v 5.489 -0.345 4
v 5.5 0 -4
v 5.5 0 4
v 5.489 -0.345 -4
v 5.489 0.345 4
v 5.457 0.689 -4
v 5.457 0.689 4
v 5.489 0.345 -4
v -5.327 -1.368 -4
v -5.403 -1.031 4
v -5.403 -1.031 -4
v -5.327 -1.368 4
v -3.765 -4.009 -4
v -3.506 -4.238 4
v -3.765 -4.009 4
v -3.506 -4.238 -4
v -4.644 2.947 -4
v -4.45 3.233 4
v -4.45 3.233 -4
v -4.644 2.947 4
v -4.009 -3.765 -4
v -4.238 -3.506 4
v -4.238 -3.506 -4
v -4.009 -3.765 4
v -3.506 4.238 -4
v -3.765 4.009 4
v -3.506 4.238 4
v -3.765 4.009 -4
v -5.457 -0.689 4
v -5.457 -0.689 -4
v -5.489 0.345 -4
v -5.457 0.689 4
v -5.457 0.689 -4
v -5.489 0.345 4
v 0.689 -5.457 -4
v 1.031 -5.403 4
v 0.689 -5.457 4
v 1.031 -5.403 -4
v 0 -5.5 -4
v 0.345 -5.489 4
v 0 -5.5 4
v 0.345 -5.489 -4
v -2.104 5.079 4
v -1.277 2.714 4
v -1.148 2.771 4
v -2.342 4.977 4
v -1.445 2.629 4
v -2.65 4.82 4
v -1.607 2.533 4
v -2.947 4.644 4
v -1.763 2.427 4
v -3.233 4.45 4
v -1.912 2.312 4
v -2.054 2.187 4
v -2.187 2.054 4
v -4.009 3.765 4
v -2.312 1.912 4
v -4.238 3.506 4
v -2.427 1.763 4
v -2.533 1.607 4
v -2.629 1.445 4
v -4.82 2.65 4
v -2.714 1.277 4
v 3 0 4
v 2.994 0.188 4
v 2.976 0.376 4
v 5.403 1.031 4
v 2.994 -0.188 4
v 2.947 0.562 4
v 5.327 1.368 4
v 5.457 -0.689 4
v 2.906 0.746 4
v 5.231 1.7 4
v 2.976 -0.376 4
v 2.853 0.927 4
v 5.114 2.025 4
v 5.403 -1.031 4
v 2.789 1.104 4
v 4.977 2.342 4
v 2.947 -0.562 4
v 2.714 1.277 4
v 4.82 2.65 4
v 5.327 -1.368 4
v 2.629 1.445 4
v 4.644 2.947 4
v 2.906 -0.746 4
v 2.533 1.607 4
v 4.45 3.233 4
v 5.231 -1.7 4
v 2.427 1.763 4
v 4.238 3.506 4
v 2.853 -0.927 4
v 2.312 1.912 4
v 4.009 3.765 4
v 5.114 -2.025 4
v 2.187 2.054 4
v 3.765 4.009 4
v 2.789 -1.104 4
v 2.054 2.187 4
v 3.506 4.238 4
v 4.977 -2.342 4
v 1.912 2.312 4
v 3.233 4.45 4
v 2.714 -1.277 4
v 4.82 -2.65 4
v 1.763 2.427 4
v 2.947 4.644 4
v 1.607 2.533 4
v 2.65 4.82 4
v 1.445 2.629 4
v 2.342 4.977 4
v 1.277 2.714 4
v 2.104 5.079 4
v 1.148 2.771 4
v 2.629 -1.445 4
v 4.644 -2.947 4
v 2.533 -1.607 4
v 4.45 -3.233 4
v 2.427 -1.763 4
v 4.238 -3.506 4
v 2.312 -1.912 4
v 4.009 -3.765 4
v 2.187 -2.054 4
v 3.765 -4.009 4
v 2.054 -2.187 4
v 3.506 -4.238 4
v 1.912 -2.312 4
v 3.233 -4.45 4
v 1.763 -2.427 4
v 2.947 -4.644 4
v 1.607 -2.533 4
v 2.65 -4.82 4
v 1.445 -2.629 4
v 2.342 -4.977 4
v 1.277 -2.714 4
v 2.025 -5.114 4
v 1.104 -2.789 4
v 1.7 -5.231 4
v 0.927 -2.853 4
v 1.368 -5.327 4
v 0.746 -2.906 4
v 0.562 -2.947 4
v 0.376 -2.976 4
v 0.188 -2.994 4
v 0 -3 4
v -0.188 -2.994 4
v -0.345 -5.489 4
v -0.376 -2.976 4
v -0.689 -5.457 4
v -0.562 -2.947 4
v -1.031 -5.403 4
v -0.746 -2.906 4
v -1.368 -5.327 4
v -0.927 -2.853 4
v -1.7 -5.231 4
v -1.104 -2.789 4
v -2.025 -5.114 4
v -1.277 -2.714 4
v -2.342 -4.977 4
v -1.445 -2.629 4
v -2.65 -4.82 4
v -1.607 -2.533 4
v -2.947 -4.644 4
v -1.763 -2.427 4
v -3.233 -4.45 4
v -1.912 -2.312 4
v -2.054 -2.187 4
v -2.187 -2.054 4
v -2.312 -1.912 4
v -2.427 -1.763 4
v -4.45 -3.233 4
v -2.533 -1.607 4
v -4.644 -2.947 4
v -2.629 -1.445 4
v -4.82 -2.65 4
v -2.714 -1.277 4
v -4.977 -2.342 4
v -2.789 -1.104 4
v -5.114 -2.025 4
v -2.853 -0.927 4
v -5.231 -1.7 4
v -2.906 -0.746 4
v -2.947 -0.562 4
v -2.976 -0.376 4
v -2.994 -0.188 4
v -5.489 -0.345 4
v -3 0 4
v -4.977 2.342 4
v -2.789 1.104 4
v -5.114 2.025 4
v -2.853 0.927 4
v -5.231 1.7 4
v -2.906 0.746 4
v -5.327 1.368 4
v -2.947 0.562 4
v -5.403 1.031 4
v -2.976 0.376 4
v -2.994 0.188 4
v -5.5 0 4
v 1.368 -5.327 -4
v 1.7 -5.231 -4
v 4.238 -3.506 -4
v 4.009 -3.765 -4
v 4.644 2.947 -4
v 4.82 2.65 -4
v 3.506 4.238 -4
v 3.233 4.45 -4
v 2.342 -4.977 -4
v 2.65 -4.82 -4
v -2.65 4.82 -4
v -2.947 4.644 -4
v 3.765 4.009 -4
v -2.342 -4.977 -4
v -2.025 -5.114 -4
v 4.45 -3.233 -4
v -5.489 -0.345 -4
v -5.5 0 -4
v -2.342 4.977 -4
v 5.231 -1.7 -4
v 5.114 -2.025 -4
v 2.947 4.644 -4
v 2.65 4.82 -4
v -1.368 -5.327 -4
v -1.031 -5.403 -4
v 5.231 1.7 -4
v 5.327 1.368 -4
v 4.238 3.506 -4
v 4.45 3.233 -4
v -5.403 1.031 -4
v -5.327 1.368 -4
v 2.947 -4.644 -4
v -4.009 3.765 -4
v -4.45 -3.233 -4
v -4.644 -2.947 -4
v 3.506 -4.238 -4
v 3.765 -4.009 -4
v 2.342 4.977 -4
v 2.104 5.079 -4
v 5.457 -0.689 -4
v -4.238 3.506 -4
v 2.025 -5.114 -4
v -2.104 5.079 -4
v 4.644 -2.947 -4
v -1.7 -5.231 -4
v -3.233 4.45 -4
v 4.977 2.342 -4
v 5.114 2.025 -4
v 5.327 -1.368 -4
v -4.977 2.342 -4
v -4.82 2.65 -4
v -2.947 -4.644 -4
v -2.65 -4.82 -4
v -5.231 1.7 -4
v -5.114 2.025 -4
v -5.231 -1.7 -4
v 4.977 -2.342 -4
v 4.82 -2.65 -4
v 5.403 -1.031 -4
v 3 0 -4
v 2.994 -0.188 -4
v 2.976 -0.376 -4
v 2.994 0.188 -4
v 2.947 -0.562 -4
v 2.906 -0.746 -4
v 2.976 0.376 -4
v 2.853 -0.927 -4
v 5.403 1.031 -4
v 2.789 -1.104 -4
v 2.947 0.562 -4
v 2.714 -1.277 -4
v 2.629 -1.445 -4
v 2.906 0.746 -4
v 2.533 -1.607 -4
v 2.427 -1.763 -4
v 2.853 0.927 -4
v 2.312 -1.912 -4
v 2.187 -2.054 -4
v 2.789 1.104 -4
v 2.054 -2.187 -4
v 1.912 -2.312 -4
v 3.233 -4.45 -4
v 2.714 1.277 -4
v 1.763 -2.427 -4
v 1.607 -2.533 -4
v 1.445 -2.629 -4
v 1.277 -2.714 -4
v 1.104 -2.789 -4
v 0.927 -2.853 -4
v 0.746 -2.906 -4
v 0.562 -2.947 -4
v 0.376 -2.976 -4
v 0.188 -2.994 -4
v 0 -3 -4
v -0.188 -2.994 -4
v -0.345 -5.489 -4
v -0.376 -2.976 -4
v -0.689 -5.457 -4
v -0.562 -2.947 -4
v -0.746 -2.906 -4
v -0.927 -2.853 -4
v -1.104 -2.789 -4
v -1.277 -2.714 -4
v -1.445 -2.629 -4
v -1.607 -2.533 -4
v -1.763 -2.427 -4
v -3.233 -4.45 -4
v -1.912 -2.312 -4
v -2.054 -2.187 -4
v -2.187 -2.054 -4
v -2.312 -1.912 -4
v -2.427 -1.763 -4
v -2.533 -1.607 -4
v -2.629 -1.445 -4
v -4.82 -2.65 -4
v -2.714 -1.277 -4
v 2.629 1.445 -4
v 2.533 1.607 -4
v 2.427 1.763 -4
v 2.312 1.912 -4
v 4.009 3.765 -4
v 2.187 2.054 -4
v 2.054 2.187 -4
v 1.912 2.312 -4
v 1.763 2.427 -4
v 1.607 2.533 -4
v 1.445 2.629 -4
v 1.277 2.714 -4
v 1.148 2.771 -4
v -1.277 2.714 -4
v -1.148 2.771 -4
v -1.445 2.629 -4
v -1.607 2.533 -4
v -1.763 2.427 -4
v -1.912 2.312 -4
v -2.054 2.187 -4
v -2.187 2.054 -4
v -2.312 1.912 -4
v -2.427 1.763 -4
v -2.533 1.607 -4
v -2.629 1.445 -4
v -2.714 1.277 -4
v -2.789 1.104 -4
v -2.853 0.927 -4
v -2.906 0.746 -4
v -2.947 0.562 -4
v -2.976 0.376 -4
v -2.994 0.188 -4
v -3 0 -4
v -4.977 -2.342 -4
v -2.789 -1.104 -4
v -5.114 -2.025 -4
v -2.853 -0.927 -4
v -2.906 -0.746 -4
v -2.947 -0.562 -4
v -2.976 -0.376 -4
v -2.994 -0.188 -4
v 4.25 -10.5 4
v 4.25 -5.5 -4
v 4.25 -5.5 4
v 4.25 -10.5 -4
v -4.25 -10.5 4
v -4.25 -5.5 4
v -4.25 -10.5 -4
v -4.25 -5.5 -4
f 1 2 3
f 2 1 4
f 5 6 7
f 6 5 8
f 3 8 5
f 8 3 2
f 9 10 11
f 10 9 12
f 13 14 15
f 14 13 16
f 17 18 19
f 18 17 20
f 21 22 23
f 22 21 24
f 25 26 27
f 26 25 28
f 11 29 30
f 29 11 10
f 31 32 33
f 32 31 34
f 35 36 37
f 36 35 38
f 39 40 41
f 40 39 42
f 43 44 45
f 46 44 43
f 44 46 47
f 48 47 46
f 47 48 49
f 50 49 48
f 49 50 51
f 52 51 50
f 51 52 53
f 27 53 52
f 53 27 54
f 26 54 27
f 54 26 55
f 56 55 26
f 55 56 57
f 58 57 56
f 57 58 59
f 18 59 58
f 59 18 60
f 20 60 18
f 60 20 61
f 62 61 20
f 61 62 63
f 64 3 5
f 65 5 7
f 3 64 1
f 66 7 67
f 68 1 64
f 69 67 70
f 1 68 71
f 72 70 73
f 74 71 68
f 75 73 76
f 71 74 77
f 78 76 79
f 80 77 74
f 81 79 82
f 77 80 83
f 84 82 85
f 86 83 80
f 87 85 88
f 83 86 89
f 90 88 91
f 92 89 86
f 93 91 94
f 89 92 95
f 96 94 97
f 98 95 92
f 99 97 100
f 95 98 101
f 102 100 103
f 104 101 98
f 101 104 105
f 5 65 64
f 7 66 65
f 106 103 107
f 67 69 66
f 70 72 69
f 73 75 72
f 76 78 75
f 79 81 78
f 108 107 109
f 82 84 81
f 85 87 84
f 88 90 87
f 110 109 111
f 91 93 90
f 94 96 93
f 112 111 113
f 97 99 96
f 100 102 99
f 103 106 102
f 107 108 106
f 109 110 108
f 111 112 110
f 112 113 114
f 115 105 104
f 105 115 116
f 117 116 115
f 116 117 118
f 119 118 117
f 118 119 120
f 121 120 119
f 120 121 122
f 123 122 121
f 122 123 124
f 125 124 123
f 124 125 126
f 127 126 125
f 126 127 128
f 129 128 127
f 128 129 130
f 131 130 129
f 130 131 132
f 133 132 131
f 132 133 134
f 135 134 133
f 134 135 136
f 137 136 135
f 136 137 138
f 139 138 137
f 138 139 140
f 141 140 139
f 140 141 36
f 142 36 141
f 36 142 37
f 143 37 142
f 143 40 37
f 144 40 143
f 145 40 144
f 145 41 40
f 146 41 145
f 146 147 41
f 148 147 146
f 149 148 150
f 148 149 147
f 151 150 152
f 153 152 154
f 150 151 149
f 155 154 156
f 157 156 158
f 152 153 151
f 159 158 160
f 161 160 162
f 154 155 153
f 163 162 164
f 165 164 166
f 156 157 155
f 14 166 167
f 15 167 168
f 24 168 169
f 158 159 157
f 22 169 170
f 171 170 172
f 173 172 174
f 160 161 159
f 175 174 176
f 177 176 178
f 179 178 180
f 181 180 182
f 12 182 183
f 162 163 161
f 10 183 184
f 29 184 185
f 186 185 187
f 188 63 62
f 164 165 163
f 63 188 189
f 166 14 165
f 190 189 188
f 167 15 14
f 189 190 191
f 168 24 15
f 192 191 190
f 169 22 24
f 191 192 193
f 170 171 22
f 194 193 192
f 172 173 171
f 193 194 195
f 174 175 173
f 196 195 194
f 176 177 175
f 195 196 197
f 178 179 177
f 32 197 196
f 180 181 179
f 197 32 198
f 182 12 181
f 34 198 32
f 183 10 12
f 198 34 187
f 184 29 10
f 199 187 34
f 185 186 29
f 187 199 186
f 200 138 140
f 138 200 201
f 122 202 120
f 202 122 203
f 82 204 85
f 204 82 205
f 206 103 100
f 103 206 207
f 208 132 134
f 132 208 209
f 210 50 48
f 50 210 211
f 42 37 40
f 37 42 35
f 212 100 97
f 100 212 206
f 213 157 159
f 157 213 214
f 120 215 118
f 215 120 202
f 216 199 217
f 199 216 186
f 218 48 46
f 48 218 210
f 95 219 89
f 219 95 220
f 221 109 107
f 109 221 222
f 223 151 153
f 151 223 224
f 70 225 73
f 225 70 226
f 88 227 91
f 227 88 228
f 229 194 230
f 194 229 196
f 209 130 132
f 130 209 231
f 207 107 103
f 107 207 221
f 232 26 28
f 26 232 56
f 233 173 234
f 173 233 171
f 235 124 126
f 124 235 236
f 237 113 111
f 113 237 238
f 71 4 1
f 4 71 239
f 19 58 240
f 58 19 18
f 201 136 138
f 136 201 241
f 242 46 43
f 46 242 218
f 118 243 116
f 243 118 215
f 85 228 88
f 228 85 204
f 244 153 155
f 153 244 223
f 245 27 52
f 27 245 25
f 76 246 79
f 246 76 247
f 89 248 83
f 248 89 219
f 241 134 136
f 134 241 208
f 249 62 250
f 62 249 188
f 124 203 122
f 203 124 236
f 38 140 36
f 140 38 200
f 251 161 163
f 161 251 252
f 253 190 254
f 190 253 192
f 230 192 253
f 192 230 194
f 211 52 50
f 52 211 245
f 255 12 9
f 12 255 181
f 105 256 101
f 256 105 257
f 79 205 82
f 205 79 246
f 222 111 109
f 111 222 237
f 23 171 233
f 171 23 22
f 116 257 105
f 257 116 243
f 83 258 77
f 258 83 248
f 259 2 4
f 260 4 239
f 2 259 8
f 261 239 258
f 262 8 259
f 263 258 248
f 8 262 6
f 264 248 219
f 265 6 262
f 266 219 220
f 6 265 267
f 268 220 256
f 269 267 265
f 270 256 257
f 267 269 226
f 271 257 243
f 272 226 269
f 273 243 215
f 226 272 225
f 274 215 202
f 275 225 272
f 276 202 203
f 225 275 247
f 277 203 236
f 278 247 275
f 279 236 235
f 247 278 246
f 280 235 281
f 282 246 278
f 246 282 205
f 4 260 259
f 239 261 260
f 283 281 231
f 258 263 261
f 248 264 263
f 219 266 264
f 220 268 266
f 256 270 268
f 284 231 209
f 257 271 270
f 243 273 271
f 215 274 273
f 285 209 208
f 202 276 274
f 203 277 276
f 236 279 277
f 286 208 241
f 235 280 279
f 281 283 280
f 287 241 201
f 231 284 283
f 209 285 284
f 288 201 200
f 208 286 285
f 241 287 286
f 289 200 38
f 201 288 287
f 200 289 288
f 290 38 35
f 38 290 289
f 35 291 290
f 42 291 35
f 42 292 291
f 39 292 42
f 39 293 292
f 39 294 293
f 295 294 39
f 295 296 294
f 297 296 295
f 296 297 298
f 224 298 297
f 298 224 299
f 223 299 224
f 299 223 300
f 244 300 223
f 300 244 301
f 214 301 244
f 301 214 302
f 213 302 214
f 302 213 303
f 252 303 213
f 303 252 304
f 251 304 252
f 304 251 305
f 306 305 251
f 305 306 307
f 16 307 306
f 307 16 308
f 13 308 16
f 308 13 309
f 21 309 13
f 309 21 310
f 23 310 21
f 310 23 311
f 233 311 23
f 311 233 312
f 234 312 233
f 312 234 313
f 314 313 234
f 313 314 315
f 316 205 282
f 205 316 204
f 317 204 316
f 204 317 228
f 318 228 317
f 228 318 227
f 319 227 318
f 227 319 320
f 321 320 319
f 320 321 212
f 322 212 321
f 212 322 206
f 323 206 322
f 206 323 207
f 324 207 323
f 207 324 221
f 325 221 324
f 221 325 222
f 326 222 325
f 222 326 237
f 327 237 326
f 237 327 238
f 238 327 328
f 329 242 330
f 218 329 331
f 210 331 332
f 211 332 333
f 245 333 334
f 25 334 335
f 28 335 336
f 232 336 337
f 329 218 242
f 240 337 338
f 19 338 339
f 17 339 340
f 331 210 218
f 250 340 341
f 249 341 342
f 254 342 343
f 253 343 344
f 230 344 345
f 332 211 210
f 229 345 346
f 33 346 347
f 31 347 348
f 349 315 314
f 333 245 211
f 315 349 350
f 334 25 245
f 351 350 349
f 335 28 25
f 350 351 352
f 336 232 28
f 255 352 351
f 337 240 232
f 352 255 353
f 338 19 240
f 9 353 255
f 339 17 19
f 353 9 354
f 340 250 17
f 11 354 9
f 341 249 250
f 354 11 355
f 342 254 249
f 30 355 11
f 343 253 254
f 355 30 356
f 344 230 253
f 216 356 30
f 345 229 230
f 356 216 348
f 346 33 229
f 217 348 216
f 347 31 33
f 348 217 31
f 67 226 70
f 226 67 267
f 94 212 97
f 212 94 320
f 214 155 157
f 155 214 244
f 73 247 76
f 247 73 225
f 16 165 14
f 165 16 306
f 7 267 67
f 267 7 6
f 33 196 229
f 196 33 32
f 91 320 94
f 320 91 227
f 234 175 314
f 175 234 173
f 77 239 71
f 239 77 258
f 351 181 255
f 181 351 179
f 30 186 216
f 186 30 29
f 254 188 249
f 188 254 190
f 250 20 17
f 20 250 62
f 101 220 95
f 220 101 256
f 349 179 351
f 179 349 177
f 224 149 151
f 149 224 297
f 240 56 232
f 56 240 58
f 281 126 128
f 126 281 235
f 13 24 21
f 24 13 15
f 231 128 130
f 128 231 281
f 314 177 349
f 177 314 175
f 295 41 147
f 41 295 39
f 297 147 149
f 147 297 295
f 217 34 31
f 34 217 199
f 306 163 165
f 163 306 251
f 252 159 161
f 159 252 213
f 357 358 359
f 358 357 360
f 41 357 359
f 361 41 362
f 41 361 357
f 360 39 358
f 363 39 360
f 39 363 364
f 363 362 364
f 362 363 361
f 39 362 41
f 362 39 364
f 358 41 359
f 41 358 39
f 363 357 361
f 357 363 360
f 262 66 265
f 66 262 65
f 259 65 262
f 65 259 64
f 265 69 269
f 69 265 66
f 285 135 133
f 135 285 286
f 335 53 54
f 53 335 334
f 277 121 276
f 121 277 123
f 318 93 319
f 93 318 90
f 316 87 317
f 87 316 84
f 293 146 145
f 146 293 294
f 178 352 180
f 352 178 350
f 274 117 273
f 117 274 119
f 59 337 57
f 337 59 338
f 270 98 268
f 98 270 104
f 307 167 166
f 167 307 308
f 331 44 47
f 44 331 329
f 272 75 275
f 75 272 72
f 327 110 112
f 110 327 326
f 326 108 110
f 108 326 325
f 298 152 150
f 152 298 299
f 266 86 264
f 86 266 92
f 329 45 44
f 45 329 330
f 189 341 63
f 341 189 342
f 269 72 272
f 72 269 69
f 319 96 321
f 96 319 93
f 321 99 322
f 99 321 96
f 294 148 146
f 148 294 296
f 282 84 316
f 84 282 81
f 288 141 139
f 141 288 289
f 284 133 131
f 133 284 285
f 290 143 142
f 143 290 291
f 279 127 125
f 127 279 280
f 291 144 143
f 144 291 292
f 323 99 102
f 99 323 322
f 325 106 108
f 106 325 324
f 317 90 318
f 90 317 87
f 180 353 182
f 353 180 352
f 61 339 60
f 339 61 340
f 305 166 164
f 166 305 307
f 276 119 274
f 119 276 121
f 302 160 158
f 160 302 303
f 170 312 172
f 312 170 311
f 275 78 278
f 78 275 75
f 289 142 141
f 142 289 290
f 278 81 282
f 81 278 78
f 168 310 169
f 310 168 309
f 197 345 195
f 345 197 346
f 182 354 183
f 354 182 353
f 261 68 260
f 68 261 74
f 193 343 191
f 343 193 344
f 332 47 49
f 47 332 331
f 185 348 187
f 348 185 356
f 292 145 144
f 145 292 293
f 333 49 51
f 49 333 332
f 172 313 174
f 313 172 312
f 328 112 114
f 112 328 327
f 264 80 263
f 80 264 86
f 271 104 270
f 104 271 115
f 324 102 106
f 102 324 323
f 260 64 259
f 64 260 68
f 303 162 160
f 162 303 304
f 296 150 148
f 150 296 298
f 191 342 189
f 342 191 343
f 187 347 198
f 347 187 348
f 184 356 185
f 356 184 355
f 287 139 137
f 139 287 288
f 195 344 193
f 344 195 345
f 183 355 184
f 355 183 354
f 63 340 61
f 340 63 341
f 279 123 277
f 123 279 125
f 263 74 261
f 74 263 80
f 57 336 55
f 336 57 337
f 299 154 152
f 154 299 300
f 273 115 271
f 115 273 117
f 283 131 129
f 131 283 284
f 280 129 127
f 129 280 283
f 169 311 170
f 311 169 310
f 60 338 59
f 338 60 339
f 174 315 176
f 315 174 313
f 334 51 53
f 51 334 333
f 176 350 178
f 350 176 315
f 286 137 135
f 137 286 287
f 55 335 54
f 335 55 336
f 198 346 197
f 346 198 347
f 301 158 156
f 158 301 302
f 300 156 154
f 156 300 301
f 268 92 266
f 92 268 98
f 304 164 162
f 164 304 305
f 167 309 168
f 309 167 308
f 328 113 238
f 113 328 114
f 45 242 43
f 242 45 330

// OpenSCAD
// ==========================================
// RT ARCHITECTURE - FLEXIBLE POWER HARNESS RING
// ==========================================

$fn = 100; // Render resolution

// --- Parameters ---
cable_diameter = 6.0;   // Diameter of your heavy gauge power cable
ring_thickness = 2.5;   // Wall thickness of the snap-ring
harness_width = 8.0;    // Depth/width of the harness clip
gap_angle = 45;         // Opening expansion gap angle in degrees
mount_height = 5.0;     // Base anchoring section offset

module power_cable_harness() {
    difference() {
        // Main Outer Ring Structure
        union() {
            cylinder(h=harness_width, d=cable_diameter + (ring_thickness * 2), center=true);
            
            // Third section anchor latch mount
            translate([0, -(cable_diameter/2 + ring_thickness + mount_height/2), 0])
                cube([cable_diameter + ring_thickness, mount_height, harness_width], center=true);
        }
        
        // Inner Core Cable Routing Channel
        cylinder(h=harness_width + 2, d=cable_diameter, center=true);
        
        // Compliant Expansion Cutout Latch (Top Section Open Gap)
        rotate([0, 0, 90])
            linear_extrude(height=harness_width + 2, center=true)
                polygon(points=[
                    [0, 0],
                    [cable_diameter * 2 * cos(gap_angle/2), cable_diameter * 2 * sin(gap_angle/2)],
                    [cable_diameter * 2 * cos(-gap_angle/2), cable_diameter * 2 * sin(-gap_angle/2)]
                ]);
    }
}

// Render the structural component
power_cable_harness();
